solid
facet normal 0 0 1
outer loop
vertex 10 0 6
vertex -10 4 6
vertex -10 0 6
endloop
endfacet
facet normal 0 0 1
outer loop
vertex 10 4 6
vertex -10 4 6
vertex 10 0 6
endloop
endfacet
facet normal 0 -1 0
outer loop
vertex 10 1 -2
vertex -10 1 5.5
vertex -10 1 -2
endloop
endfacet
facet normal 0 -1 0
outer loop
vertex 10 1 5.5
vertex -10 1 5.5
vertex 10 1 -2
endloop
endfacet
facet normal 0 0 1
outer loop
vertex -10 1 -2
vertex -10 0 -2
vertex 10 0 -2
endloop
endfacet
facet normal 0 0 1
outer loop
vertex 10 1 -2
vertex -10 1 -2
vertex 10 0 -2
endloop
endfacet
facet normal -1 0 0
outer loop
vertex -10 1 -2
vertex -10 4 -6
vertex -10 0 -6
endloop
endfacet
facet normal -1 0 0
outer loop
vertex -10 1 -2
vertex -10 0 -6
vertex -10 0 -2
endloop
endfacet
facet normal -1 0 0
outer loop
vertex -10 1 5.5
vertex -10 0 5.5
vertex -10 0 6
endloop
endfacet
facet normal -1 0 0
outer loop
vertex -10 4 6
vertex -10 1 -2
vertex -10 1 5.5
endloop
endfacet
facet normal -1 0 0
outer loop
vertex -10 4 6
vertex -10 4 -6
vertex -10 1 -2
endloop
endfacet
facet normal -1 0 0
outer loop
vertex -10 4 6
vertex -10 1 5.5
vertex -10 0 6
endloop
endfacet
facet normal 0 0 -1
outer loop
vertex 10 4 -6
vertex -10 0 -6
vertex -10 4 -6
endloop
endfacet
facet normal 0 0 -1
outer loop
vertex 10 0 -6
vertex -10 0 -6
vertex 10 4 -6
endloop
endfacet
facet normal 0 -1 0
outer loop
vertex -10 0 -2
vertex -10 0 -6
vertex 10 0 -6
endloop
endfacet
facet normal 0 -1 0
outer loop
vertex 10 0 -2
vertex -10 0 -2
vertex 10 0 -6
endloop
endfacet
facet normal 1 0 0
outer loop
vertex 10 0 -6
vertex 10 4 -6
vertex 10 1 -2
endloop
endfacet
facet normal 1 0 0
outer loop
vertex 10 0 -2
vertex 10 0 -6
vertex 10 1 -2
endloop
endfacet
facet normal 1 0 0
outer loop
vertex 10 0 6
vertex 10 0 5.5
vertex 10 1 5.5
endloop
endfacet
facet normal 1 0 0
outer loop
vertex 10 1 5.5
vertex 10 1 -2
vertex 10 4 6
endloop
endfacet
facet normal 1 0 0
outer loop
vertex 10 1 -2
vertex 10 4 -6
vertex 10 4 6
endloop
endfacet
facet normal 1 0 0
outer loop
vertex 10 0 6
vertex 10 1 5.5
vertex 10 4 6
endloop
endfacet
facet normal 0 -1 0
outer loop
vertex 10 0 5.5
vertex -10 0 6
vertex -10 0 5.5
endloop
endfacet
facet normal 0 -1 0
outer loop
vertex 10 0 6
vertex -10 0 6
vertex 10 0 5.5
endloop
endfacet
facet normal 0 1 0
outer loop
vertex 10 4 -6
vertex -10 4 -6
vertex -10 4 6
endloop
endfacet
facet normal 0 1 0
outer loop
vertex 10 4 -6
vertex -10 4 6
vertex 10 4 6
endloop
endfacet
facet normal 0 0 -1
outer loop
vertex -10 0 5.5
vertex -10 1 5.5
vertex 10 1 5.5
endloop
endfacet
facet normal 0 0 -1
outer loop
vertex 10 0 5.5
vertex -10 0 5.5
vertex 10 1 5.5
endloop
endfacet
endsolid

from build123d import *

# Parameters (mm, degrees)
SKETCH2_W           = 20
SKETCH2_H           = 12
BOSS_EXTRUDE1_DEPTH = 4
SKETCH3_W           = 20
SKETCH3_H           = 8
CUT_EXTRUDE1_DEPTH  = 1
SKETCH4_W           = 20
SKETCH4_H           = 0.5
BOSS_EXTRUDE2_DEPTH = 1


with BuildPart() as part:
    # Sketch2 → Boss-Extrude1 (new body)
    with BuildSketch(Plane(origin=(0, 0, 0), x_dir=(1, 0, 0), z_dir=(0, 1, 0))):
        Rectangle(SKETCH2_W, SKETCH2_H)
    extrude(amount=BOSS_EXTRUDE1_DEPTH)

    # Sketch3 → Cut-Extrude1 (cut)
    with BuildSketch(Plane.XZ):
        with Locations((0, 2)):
            Rectangle(SKETCH3_W, SKETCH3_H)
    extrude(amount=-CUT_EXTRUDE1_DEPTH, mode=Mode.SUBTRACT)

    # Sketch4 → Boss-Extrude2 (add)
    with BuildSketch(Plane.XZ.offset(-1)):
        with Locations((0, 5.75)):
            Rectangle(SKETCH4_W, SKETCH4_H)
    extrude(amount=BOSS_EXTRUDE2_DEPTH)


solid = part.part
